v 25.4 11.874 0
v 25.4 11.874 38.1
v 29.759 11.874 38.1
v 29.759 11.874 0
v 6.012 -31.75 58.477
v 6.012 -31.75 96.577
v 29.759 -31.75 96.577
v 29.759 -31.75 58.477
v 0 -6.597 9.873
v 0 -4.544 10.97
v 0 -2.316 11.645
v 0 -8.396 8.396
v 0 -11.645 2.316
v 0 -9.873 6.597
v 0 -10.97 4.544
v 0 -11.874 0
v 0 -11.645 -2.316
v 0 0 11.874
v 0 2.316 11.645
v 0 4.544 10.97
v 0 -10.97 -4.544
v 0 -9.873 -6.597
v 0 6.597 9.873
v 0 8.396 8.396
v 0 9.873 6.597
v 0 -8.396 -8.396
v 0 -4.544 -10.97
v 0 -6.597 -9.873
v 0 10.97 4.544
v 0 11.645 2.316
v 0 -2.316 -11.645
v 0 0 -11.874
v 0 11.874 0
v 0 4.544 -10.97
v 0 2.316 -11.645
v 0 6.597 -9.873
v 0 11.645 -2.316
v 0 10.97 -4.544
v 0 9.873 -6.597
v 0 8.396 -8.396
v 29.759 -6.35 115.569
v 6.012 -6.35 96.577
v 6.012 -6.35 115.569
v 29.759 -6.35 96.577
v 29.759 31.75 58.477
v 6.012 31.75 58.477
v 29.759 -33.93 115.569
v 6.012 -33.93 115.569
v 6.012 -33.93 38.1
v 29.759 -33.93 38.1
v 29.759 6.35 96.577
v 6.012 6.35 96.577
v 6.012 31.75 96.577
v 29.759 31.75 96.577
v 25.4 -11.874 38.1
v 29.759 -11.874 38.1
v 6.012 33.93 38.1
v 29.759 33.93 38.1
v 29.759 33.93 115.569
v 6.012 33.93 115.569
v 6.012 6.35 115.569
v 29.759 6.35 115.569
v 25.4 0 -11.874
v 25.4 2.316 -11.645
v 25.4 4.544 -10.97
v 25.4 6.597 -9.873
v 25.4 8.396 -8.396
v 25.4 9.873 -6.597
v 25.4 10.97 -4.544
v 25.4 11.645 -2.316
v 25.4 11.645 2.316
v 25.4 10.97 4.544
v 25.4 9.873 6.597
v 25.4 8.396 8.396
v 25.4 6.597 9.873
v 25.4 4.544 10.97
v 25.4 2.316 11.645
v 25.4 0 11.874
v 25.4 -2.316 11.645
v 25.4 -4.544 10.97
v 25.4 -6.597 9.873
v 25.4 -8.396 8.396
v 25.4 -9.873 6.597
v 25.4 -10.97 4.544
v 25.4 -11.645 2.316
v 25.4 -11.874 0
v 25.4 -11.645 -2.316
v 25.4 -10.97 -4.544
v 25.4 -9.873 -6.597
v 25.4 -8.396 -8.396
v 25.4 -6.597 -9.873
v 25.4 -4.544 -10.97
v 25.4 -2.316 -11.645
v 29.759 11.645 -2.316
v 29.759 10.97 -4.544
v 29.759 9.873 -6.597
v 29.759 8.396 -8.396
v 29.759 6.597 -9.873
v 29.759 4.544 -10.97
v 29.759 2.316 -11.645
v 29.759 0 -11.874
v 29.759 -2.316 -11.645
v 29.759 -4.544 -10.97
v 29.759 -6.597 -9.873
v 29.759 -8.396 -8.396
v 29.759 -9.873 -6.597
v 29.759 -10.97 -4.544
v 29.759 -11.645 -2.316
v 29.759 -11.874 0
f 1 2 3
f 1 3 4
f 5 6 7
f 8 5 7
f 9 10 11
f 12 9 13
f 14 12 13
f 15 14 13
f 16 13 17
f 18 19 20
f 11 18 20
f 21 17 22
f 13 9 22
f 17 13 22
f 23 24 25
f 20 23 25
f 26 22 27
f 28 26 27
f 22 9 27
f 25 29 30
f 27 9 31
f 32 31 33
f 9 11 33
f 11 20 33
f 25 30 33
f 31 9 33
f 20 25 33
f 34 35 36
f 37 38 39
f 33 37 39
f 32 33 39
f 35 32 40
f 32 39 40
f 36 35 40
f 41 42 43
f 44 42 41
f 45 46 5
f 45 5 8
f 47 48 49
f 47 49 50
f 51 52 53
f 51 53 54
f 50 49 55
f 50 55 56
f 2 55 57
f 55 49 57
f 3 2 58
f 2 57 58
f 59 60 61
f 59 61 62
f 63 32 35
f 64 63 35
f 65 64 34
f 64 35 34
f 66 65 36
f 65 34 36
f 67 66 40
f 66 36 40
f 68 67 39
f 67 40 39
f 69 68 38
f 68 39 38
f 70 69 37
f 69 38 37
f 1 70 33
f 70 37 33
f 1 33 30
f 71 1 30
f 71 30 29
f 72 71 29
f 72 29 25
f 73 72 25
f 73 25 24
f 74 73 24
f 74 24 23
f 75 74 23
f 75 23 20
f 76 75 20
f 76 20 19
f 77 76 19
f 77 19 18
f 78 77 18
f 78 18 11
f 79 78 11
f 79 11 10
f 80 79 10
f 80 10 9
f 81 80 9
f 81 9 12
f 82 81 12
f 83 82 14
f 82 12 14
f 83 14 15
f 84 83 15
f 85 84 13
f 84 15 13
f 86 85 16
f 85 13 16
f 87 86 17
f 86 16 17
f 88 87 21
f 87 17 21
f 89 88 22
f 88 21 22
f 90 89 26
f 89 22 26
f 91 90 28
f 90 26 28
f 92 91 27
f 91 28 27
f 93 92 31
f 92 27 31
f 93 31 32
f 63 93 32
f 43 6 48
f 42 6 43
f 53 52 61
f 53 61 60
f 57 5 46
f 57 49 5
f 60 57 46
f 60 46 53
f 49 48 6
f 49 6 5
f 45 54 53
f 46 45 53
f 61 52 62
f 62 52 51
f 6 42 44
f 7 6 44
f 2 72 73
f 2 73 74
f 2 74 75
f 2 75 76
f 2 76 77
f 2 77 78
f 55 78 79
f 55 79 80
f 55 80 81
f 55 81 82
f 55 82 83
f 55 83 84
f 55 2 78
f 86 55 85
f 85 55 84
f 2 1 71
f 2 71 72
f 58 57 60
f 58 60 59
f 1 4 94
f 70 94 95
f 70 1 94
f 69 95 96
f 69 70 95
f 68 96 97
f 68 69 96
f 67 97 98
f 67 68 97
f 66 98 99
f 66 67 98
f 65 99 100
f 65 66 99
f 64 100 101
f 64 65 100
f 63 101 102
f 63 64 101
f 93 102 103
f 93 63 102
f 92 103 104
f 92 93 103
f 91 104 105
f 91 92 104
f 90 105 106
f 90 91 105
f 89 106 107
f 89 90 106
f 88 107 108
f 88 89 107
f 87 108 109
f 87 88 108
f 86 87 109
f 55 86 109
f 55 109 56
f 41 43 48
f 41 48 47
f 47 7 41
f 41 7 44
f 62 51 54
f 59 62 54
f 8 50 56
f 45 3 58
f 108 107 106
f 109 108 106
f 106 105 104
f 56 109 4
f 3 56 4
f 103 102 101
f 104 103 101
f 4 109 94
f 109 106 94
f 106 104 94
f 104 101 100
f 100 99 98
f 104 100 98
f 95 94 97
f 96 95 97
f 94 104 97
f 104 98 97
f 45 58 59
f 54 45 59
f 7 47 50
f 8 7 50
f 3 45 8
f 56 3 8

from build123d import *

# Parameters (mm, degrees)
SKETCH1_R           = 11.873640169
BOSS_EXTRUDE1_DEPTH = 25.4
BOSS_EXTRUDE2_DEPTH = 4.359372013
SKETCH3_W           = 23.747280338
SKETCH3_H           = 63.5
BOSS_EXTRUDE3_DEPTH = 20.377197654
SKETCH6_W           = 23.747280338
SKETCH6_H           = 58.477197654
BOSS_EXTRUDE4_DEPTH = 2.179686006
SKETCH7_W           = 23.747280338
SKETCH7_H           = 58.477197654
BOSS_EXTRUDE5_DEPTH = 2.179686006
SKETCH8_W           = 23.747280338
SKETCH8_H           = 27.579686006
BOSS_EXTRUDE6_DEPTH = 18.991849144


with BuildPart() as part:
    # Sketch1 → Boss-Extrude1 (new body)
    with BuildSketch(Plane.YZ):
        Circle(SKETCH1_R)
    extrude(amount=BOSS_EXTRUDE1_DEPTH)

    # Sketch2 → Boss-Extrude2 (add)
    with BuildSketch(Plane.YZ.offset(25.4)):
        with BuildLine():
            Line((-11.873640169, -1.316e-06), (-11.873640169, 38.099998684))
            Line((-11.873640169, 38.099998684), (11.873640169, 38.099998684))
            Line((11.873640169, 38.099998684), (11.873640169, 0))
            ThreePointArc((11.873640169, 0), (6.58e-07, -11.873640169), (-11.873640169, -1.316e-06))
        make_face()
    extrude(amount=BOSS_EXTRUDE2_DEPTH)

    # Sketch3 → Boss-Extrude3 (add)
    with BuildSketch(Plane.XY.offset(38.099998684)):
        with Locations((17.885731844, 0)):
            Rectangle(SKETCH3_W, SKETCH3_H)
    extrude(amount=BOSS_EXTRUDE3_DEPTH)

    # Sketch6 → Boss-Extrude4 (add)
    with BuildSketch(Plane(origin=(0, 31.75, 0), x_dir=(-1, 0, 0), z_dir=(0, 1, 0))):
        with Locations((-17.885731844, 67.338597511)):
            Rectangle(SKETCH6_W, SKETCH6_H)
    extrude(amount=BOSS_EXTRUDE4_DEPTH)

    # Sketch7 → Boss-Extrude5 (add)
    with BuildSketch(Plane.XZ.offset(31.75)):
        with Locations((17.885731844, 67.338597511)):
            Rectangle(SKETCH7_W, SKETCH7_H)
    extrude(amount=BOSS_EXTRUDE5_DEPTH)

    # Sketch8 → Boss-Extrude6 (add)
    with BuildSketch(Plane.XY.offset(96.577196338)):
        with Locations((17.885731844, 20.139843003)):
            Rectangle(SKETCH8_W, SKETCH8_H)
        with Locations((17.885731844, -20.139843003)):
            Rectangle(SKETCH8_W, SKETCH8_H)
    extrude(amount=BOSS_EXTRUDE6_DEPTH)


solid = part.part
